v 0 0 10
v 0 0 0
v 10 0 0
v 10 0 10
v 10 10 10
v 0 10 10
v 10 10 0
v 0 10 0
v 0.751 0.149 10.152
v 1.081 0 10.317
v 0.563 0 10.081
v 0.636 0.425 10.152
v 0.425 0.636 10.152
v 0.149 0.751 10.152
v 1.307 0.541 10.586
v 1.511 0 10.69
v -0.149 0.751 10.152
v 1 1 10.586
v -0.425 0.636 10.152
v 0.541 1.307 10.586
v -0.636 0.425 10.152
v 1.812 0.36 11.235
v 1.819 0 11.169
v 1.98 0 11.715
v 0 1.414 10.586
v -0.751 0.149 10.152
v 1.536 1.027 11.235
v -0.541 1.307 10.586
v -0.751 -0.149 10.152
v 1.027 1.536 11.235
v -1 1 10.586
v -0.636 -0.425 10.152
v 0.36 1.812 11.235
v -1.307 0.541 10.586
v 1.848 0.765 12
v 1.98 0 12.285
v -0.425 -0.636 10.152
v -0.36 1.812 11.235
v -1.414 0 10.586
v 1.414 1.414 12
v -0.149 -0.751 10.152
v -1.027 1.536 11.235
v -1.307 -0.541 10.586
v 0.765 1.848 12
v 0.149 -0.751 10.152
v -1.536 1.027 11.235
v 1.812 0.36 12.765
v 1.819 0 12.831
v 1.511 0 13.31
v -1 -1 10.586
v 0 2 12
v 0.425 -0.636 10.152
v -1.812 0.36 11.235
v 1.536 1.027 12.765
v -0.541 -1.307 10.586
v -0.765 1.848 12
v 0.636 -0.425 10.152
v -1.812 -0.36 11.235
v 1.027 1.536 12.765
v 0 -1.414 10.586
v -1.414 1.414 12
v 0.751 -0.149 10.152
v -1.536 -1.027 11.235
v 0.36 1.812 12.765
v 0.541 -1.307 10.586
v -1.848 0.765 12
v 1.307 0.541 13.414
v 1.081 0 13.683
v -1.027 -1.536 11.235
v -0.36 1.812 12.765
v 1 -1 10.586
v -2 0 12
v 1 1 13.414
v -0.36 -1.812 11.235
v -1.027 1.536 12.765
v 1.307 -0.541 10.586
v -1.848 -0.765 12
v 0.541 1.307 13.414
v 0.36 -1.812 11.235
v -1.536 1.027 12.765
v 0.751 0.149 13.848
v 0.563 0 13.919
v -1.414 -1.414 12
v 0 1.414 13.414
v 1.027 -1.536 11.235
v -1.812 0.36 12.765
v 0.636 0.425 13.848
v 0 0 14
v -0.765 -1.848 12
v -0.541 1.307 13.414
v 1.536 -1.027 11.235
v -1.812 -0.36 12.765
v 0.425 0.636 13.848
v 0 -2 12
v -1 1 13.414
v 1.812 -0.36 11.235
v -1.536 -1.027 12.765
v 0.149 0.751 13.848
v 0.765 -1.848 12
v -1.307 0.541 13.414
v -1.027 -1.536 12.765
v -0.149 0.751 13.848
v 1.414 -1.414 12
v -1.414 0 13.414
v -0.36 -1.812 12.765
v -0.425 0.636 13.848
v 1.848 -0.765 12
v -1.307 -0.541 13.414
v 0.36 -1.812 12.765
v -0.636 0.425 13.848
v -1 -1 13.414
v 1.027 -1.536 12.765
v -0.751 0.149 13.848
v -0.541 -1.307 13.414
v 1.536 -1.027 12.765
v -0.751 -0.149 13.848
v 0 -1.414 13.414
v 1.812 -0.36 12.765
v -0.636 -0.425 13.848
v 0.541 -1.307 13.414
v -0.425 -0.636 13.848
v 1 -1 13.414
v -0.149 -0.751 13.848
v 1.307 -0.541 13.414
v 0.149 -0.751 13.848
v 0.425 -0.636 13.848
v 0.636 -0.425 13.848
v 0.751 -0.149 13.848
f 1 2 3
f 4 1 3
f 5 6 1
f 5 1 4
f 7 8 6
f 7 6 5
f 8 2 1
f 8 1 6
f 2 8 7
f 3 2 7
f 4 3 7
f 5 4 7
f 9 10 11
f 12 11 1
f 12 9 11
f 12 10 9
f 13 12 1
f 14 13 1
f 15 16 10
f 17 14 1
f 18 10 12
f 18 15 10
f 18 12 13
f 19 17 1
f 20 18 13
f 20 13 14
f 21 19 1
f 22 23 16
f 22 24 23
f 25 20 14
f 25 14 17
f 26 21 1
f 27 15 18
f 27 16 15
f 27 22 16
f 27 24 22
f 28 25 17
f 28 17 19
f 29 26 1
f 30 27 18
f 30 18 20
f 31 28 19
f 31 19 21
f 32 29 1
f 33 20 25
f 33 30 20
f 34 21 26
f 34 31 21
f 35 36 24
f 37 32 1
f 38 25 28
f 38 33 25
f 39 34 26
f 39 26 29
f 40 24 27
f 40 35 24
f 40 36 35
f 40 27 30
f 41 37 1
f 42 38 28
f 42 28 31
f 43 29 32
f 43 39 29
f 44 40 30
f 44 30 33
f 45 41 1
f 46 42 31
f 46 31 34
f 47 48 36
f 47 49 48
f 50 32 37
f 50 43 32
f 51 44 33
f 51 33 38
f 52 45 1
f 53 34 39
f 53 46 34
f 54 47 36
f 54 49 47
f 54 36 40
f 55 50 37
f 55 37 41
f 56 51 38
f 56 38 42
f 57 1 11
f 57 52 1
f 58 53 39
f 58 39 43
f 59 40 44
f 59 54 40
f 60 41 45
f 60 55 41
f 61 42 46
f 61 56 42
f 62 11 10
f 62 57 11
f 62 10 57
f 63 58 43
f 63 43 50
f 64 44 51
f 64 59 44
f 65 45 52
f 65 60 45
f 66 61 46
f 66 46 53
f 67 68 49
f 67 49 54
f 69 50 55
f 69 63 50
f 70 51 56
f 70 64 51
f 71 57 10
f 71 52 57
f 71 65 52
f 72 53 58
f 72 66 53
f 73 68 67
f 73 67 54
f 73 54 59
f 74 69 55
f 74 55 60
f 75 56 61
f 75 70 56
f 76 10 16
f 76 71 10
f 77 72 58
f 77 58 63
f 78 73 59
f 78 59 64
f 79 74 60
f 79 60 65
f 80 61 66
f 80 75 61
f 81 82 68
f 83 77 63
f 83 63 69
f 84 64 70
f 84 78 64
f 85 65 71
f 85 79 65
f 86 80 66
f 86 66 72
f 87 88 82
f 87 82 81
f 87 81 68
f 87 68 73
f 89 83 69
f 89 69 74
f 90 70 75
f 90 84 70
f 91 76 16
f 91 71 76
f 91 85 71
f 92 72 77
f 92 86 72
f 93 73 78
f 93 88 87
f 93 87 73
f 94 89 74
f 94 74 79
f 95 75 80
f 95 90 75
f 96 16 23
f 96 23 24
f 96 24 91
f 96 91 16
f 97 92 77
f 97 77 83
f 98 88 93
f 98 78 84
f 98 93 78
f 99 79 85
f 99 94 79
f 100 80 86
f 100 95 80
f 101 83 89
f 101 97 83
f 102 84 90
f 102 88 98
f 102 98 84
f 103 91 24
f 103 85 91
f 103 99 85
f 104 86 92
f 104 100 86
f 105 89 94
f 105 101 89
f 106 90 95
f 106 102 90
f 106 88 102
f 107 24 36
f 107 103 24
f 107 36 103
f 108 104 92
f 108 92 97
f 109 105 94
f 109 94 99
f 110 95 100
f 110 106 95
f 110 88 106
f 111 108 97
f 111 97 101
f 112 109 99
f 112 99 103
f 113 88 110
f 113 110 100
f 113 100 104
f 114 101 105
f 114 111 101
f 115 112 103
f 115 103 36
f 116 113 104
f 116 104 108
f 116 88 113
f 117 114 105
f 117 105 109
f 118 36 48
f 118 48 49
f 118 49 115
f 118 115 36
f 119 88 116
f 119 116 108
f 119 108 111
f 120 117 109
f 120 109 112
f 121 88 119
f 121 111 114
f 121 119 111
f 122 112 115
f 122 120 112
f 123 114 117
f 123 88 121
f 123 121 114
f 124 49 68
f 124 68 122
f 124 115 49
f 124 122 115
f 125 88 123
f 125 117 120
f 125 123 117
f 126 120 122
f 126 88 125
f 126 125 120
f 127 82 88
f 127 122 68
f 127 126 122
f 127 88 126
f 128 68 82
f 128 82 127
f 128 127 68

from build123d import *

# Parameters (mm, degrees)
BOX_W     = 10
BOX_H     = 10
BOX_DEPTH = 10


with BuildPart() as nuestro_primer_cubo:
    # Box → Box (new body)
    with BuildSketch(Plane.XY):
        with Locations((5, 5)):
            Rectangle(BOX_W, BOX_H)
    extrude(amount=BOX_DEPTH)


with BuildPart() as nuestra_primera_esfera:
    # Sphere → Sphere (revolve)
    with BuildSketch(Plane(origin=(0, 0, 12), x_dir=(1, 0, 0), z_dir=(0, -1, 0))):
        with BuildLine():
            ThreePointArc((0, -2), (2, 0), (0, 2))
            Line((0, 2), (0, -2))
        make_face()
    revolve(axis=Axis((0, 0, 12), (0, 0, 1)))


solid = Compound([nuestro_primer_cubo.part, nuestra_primera_esfera.part])
